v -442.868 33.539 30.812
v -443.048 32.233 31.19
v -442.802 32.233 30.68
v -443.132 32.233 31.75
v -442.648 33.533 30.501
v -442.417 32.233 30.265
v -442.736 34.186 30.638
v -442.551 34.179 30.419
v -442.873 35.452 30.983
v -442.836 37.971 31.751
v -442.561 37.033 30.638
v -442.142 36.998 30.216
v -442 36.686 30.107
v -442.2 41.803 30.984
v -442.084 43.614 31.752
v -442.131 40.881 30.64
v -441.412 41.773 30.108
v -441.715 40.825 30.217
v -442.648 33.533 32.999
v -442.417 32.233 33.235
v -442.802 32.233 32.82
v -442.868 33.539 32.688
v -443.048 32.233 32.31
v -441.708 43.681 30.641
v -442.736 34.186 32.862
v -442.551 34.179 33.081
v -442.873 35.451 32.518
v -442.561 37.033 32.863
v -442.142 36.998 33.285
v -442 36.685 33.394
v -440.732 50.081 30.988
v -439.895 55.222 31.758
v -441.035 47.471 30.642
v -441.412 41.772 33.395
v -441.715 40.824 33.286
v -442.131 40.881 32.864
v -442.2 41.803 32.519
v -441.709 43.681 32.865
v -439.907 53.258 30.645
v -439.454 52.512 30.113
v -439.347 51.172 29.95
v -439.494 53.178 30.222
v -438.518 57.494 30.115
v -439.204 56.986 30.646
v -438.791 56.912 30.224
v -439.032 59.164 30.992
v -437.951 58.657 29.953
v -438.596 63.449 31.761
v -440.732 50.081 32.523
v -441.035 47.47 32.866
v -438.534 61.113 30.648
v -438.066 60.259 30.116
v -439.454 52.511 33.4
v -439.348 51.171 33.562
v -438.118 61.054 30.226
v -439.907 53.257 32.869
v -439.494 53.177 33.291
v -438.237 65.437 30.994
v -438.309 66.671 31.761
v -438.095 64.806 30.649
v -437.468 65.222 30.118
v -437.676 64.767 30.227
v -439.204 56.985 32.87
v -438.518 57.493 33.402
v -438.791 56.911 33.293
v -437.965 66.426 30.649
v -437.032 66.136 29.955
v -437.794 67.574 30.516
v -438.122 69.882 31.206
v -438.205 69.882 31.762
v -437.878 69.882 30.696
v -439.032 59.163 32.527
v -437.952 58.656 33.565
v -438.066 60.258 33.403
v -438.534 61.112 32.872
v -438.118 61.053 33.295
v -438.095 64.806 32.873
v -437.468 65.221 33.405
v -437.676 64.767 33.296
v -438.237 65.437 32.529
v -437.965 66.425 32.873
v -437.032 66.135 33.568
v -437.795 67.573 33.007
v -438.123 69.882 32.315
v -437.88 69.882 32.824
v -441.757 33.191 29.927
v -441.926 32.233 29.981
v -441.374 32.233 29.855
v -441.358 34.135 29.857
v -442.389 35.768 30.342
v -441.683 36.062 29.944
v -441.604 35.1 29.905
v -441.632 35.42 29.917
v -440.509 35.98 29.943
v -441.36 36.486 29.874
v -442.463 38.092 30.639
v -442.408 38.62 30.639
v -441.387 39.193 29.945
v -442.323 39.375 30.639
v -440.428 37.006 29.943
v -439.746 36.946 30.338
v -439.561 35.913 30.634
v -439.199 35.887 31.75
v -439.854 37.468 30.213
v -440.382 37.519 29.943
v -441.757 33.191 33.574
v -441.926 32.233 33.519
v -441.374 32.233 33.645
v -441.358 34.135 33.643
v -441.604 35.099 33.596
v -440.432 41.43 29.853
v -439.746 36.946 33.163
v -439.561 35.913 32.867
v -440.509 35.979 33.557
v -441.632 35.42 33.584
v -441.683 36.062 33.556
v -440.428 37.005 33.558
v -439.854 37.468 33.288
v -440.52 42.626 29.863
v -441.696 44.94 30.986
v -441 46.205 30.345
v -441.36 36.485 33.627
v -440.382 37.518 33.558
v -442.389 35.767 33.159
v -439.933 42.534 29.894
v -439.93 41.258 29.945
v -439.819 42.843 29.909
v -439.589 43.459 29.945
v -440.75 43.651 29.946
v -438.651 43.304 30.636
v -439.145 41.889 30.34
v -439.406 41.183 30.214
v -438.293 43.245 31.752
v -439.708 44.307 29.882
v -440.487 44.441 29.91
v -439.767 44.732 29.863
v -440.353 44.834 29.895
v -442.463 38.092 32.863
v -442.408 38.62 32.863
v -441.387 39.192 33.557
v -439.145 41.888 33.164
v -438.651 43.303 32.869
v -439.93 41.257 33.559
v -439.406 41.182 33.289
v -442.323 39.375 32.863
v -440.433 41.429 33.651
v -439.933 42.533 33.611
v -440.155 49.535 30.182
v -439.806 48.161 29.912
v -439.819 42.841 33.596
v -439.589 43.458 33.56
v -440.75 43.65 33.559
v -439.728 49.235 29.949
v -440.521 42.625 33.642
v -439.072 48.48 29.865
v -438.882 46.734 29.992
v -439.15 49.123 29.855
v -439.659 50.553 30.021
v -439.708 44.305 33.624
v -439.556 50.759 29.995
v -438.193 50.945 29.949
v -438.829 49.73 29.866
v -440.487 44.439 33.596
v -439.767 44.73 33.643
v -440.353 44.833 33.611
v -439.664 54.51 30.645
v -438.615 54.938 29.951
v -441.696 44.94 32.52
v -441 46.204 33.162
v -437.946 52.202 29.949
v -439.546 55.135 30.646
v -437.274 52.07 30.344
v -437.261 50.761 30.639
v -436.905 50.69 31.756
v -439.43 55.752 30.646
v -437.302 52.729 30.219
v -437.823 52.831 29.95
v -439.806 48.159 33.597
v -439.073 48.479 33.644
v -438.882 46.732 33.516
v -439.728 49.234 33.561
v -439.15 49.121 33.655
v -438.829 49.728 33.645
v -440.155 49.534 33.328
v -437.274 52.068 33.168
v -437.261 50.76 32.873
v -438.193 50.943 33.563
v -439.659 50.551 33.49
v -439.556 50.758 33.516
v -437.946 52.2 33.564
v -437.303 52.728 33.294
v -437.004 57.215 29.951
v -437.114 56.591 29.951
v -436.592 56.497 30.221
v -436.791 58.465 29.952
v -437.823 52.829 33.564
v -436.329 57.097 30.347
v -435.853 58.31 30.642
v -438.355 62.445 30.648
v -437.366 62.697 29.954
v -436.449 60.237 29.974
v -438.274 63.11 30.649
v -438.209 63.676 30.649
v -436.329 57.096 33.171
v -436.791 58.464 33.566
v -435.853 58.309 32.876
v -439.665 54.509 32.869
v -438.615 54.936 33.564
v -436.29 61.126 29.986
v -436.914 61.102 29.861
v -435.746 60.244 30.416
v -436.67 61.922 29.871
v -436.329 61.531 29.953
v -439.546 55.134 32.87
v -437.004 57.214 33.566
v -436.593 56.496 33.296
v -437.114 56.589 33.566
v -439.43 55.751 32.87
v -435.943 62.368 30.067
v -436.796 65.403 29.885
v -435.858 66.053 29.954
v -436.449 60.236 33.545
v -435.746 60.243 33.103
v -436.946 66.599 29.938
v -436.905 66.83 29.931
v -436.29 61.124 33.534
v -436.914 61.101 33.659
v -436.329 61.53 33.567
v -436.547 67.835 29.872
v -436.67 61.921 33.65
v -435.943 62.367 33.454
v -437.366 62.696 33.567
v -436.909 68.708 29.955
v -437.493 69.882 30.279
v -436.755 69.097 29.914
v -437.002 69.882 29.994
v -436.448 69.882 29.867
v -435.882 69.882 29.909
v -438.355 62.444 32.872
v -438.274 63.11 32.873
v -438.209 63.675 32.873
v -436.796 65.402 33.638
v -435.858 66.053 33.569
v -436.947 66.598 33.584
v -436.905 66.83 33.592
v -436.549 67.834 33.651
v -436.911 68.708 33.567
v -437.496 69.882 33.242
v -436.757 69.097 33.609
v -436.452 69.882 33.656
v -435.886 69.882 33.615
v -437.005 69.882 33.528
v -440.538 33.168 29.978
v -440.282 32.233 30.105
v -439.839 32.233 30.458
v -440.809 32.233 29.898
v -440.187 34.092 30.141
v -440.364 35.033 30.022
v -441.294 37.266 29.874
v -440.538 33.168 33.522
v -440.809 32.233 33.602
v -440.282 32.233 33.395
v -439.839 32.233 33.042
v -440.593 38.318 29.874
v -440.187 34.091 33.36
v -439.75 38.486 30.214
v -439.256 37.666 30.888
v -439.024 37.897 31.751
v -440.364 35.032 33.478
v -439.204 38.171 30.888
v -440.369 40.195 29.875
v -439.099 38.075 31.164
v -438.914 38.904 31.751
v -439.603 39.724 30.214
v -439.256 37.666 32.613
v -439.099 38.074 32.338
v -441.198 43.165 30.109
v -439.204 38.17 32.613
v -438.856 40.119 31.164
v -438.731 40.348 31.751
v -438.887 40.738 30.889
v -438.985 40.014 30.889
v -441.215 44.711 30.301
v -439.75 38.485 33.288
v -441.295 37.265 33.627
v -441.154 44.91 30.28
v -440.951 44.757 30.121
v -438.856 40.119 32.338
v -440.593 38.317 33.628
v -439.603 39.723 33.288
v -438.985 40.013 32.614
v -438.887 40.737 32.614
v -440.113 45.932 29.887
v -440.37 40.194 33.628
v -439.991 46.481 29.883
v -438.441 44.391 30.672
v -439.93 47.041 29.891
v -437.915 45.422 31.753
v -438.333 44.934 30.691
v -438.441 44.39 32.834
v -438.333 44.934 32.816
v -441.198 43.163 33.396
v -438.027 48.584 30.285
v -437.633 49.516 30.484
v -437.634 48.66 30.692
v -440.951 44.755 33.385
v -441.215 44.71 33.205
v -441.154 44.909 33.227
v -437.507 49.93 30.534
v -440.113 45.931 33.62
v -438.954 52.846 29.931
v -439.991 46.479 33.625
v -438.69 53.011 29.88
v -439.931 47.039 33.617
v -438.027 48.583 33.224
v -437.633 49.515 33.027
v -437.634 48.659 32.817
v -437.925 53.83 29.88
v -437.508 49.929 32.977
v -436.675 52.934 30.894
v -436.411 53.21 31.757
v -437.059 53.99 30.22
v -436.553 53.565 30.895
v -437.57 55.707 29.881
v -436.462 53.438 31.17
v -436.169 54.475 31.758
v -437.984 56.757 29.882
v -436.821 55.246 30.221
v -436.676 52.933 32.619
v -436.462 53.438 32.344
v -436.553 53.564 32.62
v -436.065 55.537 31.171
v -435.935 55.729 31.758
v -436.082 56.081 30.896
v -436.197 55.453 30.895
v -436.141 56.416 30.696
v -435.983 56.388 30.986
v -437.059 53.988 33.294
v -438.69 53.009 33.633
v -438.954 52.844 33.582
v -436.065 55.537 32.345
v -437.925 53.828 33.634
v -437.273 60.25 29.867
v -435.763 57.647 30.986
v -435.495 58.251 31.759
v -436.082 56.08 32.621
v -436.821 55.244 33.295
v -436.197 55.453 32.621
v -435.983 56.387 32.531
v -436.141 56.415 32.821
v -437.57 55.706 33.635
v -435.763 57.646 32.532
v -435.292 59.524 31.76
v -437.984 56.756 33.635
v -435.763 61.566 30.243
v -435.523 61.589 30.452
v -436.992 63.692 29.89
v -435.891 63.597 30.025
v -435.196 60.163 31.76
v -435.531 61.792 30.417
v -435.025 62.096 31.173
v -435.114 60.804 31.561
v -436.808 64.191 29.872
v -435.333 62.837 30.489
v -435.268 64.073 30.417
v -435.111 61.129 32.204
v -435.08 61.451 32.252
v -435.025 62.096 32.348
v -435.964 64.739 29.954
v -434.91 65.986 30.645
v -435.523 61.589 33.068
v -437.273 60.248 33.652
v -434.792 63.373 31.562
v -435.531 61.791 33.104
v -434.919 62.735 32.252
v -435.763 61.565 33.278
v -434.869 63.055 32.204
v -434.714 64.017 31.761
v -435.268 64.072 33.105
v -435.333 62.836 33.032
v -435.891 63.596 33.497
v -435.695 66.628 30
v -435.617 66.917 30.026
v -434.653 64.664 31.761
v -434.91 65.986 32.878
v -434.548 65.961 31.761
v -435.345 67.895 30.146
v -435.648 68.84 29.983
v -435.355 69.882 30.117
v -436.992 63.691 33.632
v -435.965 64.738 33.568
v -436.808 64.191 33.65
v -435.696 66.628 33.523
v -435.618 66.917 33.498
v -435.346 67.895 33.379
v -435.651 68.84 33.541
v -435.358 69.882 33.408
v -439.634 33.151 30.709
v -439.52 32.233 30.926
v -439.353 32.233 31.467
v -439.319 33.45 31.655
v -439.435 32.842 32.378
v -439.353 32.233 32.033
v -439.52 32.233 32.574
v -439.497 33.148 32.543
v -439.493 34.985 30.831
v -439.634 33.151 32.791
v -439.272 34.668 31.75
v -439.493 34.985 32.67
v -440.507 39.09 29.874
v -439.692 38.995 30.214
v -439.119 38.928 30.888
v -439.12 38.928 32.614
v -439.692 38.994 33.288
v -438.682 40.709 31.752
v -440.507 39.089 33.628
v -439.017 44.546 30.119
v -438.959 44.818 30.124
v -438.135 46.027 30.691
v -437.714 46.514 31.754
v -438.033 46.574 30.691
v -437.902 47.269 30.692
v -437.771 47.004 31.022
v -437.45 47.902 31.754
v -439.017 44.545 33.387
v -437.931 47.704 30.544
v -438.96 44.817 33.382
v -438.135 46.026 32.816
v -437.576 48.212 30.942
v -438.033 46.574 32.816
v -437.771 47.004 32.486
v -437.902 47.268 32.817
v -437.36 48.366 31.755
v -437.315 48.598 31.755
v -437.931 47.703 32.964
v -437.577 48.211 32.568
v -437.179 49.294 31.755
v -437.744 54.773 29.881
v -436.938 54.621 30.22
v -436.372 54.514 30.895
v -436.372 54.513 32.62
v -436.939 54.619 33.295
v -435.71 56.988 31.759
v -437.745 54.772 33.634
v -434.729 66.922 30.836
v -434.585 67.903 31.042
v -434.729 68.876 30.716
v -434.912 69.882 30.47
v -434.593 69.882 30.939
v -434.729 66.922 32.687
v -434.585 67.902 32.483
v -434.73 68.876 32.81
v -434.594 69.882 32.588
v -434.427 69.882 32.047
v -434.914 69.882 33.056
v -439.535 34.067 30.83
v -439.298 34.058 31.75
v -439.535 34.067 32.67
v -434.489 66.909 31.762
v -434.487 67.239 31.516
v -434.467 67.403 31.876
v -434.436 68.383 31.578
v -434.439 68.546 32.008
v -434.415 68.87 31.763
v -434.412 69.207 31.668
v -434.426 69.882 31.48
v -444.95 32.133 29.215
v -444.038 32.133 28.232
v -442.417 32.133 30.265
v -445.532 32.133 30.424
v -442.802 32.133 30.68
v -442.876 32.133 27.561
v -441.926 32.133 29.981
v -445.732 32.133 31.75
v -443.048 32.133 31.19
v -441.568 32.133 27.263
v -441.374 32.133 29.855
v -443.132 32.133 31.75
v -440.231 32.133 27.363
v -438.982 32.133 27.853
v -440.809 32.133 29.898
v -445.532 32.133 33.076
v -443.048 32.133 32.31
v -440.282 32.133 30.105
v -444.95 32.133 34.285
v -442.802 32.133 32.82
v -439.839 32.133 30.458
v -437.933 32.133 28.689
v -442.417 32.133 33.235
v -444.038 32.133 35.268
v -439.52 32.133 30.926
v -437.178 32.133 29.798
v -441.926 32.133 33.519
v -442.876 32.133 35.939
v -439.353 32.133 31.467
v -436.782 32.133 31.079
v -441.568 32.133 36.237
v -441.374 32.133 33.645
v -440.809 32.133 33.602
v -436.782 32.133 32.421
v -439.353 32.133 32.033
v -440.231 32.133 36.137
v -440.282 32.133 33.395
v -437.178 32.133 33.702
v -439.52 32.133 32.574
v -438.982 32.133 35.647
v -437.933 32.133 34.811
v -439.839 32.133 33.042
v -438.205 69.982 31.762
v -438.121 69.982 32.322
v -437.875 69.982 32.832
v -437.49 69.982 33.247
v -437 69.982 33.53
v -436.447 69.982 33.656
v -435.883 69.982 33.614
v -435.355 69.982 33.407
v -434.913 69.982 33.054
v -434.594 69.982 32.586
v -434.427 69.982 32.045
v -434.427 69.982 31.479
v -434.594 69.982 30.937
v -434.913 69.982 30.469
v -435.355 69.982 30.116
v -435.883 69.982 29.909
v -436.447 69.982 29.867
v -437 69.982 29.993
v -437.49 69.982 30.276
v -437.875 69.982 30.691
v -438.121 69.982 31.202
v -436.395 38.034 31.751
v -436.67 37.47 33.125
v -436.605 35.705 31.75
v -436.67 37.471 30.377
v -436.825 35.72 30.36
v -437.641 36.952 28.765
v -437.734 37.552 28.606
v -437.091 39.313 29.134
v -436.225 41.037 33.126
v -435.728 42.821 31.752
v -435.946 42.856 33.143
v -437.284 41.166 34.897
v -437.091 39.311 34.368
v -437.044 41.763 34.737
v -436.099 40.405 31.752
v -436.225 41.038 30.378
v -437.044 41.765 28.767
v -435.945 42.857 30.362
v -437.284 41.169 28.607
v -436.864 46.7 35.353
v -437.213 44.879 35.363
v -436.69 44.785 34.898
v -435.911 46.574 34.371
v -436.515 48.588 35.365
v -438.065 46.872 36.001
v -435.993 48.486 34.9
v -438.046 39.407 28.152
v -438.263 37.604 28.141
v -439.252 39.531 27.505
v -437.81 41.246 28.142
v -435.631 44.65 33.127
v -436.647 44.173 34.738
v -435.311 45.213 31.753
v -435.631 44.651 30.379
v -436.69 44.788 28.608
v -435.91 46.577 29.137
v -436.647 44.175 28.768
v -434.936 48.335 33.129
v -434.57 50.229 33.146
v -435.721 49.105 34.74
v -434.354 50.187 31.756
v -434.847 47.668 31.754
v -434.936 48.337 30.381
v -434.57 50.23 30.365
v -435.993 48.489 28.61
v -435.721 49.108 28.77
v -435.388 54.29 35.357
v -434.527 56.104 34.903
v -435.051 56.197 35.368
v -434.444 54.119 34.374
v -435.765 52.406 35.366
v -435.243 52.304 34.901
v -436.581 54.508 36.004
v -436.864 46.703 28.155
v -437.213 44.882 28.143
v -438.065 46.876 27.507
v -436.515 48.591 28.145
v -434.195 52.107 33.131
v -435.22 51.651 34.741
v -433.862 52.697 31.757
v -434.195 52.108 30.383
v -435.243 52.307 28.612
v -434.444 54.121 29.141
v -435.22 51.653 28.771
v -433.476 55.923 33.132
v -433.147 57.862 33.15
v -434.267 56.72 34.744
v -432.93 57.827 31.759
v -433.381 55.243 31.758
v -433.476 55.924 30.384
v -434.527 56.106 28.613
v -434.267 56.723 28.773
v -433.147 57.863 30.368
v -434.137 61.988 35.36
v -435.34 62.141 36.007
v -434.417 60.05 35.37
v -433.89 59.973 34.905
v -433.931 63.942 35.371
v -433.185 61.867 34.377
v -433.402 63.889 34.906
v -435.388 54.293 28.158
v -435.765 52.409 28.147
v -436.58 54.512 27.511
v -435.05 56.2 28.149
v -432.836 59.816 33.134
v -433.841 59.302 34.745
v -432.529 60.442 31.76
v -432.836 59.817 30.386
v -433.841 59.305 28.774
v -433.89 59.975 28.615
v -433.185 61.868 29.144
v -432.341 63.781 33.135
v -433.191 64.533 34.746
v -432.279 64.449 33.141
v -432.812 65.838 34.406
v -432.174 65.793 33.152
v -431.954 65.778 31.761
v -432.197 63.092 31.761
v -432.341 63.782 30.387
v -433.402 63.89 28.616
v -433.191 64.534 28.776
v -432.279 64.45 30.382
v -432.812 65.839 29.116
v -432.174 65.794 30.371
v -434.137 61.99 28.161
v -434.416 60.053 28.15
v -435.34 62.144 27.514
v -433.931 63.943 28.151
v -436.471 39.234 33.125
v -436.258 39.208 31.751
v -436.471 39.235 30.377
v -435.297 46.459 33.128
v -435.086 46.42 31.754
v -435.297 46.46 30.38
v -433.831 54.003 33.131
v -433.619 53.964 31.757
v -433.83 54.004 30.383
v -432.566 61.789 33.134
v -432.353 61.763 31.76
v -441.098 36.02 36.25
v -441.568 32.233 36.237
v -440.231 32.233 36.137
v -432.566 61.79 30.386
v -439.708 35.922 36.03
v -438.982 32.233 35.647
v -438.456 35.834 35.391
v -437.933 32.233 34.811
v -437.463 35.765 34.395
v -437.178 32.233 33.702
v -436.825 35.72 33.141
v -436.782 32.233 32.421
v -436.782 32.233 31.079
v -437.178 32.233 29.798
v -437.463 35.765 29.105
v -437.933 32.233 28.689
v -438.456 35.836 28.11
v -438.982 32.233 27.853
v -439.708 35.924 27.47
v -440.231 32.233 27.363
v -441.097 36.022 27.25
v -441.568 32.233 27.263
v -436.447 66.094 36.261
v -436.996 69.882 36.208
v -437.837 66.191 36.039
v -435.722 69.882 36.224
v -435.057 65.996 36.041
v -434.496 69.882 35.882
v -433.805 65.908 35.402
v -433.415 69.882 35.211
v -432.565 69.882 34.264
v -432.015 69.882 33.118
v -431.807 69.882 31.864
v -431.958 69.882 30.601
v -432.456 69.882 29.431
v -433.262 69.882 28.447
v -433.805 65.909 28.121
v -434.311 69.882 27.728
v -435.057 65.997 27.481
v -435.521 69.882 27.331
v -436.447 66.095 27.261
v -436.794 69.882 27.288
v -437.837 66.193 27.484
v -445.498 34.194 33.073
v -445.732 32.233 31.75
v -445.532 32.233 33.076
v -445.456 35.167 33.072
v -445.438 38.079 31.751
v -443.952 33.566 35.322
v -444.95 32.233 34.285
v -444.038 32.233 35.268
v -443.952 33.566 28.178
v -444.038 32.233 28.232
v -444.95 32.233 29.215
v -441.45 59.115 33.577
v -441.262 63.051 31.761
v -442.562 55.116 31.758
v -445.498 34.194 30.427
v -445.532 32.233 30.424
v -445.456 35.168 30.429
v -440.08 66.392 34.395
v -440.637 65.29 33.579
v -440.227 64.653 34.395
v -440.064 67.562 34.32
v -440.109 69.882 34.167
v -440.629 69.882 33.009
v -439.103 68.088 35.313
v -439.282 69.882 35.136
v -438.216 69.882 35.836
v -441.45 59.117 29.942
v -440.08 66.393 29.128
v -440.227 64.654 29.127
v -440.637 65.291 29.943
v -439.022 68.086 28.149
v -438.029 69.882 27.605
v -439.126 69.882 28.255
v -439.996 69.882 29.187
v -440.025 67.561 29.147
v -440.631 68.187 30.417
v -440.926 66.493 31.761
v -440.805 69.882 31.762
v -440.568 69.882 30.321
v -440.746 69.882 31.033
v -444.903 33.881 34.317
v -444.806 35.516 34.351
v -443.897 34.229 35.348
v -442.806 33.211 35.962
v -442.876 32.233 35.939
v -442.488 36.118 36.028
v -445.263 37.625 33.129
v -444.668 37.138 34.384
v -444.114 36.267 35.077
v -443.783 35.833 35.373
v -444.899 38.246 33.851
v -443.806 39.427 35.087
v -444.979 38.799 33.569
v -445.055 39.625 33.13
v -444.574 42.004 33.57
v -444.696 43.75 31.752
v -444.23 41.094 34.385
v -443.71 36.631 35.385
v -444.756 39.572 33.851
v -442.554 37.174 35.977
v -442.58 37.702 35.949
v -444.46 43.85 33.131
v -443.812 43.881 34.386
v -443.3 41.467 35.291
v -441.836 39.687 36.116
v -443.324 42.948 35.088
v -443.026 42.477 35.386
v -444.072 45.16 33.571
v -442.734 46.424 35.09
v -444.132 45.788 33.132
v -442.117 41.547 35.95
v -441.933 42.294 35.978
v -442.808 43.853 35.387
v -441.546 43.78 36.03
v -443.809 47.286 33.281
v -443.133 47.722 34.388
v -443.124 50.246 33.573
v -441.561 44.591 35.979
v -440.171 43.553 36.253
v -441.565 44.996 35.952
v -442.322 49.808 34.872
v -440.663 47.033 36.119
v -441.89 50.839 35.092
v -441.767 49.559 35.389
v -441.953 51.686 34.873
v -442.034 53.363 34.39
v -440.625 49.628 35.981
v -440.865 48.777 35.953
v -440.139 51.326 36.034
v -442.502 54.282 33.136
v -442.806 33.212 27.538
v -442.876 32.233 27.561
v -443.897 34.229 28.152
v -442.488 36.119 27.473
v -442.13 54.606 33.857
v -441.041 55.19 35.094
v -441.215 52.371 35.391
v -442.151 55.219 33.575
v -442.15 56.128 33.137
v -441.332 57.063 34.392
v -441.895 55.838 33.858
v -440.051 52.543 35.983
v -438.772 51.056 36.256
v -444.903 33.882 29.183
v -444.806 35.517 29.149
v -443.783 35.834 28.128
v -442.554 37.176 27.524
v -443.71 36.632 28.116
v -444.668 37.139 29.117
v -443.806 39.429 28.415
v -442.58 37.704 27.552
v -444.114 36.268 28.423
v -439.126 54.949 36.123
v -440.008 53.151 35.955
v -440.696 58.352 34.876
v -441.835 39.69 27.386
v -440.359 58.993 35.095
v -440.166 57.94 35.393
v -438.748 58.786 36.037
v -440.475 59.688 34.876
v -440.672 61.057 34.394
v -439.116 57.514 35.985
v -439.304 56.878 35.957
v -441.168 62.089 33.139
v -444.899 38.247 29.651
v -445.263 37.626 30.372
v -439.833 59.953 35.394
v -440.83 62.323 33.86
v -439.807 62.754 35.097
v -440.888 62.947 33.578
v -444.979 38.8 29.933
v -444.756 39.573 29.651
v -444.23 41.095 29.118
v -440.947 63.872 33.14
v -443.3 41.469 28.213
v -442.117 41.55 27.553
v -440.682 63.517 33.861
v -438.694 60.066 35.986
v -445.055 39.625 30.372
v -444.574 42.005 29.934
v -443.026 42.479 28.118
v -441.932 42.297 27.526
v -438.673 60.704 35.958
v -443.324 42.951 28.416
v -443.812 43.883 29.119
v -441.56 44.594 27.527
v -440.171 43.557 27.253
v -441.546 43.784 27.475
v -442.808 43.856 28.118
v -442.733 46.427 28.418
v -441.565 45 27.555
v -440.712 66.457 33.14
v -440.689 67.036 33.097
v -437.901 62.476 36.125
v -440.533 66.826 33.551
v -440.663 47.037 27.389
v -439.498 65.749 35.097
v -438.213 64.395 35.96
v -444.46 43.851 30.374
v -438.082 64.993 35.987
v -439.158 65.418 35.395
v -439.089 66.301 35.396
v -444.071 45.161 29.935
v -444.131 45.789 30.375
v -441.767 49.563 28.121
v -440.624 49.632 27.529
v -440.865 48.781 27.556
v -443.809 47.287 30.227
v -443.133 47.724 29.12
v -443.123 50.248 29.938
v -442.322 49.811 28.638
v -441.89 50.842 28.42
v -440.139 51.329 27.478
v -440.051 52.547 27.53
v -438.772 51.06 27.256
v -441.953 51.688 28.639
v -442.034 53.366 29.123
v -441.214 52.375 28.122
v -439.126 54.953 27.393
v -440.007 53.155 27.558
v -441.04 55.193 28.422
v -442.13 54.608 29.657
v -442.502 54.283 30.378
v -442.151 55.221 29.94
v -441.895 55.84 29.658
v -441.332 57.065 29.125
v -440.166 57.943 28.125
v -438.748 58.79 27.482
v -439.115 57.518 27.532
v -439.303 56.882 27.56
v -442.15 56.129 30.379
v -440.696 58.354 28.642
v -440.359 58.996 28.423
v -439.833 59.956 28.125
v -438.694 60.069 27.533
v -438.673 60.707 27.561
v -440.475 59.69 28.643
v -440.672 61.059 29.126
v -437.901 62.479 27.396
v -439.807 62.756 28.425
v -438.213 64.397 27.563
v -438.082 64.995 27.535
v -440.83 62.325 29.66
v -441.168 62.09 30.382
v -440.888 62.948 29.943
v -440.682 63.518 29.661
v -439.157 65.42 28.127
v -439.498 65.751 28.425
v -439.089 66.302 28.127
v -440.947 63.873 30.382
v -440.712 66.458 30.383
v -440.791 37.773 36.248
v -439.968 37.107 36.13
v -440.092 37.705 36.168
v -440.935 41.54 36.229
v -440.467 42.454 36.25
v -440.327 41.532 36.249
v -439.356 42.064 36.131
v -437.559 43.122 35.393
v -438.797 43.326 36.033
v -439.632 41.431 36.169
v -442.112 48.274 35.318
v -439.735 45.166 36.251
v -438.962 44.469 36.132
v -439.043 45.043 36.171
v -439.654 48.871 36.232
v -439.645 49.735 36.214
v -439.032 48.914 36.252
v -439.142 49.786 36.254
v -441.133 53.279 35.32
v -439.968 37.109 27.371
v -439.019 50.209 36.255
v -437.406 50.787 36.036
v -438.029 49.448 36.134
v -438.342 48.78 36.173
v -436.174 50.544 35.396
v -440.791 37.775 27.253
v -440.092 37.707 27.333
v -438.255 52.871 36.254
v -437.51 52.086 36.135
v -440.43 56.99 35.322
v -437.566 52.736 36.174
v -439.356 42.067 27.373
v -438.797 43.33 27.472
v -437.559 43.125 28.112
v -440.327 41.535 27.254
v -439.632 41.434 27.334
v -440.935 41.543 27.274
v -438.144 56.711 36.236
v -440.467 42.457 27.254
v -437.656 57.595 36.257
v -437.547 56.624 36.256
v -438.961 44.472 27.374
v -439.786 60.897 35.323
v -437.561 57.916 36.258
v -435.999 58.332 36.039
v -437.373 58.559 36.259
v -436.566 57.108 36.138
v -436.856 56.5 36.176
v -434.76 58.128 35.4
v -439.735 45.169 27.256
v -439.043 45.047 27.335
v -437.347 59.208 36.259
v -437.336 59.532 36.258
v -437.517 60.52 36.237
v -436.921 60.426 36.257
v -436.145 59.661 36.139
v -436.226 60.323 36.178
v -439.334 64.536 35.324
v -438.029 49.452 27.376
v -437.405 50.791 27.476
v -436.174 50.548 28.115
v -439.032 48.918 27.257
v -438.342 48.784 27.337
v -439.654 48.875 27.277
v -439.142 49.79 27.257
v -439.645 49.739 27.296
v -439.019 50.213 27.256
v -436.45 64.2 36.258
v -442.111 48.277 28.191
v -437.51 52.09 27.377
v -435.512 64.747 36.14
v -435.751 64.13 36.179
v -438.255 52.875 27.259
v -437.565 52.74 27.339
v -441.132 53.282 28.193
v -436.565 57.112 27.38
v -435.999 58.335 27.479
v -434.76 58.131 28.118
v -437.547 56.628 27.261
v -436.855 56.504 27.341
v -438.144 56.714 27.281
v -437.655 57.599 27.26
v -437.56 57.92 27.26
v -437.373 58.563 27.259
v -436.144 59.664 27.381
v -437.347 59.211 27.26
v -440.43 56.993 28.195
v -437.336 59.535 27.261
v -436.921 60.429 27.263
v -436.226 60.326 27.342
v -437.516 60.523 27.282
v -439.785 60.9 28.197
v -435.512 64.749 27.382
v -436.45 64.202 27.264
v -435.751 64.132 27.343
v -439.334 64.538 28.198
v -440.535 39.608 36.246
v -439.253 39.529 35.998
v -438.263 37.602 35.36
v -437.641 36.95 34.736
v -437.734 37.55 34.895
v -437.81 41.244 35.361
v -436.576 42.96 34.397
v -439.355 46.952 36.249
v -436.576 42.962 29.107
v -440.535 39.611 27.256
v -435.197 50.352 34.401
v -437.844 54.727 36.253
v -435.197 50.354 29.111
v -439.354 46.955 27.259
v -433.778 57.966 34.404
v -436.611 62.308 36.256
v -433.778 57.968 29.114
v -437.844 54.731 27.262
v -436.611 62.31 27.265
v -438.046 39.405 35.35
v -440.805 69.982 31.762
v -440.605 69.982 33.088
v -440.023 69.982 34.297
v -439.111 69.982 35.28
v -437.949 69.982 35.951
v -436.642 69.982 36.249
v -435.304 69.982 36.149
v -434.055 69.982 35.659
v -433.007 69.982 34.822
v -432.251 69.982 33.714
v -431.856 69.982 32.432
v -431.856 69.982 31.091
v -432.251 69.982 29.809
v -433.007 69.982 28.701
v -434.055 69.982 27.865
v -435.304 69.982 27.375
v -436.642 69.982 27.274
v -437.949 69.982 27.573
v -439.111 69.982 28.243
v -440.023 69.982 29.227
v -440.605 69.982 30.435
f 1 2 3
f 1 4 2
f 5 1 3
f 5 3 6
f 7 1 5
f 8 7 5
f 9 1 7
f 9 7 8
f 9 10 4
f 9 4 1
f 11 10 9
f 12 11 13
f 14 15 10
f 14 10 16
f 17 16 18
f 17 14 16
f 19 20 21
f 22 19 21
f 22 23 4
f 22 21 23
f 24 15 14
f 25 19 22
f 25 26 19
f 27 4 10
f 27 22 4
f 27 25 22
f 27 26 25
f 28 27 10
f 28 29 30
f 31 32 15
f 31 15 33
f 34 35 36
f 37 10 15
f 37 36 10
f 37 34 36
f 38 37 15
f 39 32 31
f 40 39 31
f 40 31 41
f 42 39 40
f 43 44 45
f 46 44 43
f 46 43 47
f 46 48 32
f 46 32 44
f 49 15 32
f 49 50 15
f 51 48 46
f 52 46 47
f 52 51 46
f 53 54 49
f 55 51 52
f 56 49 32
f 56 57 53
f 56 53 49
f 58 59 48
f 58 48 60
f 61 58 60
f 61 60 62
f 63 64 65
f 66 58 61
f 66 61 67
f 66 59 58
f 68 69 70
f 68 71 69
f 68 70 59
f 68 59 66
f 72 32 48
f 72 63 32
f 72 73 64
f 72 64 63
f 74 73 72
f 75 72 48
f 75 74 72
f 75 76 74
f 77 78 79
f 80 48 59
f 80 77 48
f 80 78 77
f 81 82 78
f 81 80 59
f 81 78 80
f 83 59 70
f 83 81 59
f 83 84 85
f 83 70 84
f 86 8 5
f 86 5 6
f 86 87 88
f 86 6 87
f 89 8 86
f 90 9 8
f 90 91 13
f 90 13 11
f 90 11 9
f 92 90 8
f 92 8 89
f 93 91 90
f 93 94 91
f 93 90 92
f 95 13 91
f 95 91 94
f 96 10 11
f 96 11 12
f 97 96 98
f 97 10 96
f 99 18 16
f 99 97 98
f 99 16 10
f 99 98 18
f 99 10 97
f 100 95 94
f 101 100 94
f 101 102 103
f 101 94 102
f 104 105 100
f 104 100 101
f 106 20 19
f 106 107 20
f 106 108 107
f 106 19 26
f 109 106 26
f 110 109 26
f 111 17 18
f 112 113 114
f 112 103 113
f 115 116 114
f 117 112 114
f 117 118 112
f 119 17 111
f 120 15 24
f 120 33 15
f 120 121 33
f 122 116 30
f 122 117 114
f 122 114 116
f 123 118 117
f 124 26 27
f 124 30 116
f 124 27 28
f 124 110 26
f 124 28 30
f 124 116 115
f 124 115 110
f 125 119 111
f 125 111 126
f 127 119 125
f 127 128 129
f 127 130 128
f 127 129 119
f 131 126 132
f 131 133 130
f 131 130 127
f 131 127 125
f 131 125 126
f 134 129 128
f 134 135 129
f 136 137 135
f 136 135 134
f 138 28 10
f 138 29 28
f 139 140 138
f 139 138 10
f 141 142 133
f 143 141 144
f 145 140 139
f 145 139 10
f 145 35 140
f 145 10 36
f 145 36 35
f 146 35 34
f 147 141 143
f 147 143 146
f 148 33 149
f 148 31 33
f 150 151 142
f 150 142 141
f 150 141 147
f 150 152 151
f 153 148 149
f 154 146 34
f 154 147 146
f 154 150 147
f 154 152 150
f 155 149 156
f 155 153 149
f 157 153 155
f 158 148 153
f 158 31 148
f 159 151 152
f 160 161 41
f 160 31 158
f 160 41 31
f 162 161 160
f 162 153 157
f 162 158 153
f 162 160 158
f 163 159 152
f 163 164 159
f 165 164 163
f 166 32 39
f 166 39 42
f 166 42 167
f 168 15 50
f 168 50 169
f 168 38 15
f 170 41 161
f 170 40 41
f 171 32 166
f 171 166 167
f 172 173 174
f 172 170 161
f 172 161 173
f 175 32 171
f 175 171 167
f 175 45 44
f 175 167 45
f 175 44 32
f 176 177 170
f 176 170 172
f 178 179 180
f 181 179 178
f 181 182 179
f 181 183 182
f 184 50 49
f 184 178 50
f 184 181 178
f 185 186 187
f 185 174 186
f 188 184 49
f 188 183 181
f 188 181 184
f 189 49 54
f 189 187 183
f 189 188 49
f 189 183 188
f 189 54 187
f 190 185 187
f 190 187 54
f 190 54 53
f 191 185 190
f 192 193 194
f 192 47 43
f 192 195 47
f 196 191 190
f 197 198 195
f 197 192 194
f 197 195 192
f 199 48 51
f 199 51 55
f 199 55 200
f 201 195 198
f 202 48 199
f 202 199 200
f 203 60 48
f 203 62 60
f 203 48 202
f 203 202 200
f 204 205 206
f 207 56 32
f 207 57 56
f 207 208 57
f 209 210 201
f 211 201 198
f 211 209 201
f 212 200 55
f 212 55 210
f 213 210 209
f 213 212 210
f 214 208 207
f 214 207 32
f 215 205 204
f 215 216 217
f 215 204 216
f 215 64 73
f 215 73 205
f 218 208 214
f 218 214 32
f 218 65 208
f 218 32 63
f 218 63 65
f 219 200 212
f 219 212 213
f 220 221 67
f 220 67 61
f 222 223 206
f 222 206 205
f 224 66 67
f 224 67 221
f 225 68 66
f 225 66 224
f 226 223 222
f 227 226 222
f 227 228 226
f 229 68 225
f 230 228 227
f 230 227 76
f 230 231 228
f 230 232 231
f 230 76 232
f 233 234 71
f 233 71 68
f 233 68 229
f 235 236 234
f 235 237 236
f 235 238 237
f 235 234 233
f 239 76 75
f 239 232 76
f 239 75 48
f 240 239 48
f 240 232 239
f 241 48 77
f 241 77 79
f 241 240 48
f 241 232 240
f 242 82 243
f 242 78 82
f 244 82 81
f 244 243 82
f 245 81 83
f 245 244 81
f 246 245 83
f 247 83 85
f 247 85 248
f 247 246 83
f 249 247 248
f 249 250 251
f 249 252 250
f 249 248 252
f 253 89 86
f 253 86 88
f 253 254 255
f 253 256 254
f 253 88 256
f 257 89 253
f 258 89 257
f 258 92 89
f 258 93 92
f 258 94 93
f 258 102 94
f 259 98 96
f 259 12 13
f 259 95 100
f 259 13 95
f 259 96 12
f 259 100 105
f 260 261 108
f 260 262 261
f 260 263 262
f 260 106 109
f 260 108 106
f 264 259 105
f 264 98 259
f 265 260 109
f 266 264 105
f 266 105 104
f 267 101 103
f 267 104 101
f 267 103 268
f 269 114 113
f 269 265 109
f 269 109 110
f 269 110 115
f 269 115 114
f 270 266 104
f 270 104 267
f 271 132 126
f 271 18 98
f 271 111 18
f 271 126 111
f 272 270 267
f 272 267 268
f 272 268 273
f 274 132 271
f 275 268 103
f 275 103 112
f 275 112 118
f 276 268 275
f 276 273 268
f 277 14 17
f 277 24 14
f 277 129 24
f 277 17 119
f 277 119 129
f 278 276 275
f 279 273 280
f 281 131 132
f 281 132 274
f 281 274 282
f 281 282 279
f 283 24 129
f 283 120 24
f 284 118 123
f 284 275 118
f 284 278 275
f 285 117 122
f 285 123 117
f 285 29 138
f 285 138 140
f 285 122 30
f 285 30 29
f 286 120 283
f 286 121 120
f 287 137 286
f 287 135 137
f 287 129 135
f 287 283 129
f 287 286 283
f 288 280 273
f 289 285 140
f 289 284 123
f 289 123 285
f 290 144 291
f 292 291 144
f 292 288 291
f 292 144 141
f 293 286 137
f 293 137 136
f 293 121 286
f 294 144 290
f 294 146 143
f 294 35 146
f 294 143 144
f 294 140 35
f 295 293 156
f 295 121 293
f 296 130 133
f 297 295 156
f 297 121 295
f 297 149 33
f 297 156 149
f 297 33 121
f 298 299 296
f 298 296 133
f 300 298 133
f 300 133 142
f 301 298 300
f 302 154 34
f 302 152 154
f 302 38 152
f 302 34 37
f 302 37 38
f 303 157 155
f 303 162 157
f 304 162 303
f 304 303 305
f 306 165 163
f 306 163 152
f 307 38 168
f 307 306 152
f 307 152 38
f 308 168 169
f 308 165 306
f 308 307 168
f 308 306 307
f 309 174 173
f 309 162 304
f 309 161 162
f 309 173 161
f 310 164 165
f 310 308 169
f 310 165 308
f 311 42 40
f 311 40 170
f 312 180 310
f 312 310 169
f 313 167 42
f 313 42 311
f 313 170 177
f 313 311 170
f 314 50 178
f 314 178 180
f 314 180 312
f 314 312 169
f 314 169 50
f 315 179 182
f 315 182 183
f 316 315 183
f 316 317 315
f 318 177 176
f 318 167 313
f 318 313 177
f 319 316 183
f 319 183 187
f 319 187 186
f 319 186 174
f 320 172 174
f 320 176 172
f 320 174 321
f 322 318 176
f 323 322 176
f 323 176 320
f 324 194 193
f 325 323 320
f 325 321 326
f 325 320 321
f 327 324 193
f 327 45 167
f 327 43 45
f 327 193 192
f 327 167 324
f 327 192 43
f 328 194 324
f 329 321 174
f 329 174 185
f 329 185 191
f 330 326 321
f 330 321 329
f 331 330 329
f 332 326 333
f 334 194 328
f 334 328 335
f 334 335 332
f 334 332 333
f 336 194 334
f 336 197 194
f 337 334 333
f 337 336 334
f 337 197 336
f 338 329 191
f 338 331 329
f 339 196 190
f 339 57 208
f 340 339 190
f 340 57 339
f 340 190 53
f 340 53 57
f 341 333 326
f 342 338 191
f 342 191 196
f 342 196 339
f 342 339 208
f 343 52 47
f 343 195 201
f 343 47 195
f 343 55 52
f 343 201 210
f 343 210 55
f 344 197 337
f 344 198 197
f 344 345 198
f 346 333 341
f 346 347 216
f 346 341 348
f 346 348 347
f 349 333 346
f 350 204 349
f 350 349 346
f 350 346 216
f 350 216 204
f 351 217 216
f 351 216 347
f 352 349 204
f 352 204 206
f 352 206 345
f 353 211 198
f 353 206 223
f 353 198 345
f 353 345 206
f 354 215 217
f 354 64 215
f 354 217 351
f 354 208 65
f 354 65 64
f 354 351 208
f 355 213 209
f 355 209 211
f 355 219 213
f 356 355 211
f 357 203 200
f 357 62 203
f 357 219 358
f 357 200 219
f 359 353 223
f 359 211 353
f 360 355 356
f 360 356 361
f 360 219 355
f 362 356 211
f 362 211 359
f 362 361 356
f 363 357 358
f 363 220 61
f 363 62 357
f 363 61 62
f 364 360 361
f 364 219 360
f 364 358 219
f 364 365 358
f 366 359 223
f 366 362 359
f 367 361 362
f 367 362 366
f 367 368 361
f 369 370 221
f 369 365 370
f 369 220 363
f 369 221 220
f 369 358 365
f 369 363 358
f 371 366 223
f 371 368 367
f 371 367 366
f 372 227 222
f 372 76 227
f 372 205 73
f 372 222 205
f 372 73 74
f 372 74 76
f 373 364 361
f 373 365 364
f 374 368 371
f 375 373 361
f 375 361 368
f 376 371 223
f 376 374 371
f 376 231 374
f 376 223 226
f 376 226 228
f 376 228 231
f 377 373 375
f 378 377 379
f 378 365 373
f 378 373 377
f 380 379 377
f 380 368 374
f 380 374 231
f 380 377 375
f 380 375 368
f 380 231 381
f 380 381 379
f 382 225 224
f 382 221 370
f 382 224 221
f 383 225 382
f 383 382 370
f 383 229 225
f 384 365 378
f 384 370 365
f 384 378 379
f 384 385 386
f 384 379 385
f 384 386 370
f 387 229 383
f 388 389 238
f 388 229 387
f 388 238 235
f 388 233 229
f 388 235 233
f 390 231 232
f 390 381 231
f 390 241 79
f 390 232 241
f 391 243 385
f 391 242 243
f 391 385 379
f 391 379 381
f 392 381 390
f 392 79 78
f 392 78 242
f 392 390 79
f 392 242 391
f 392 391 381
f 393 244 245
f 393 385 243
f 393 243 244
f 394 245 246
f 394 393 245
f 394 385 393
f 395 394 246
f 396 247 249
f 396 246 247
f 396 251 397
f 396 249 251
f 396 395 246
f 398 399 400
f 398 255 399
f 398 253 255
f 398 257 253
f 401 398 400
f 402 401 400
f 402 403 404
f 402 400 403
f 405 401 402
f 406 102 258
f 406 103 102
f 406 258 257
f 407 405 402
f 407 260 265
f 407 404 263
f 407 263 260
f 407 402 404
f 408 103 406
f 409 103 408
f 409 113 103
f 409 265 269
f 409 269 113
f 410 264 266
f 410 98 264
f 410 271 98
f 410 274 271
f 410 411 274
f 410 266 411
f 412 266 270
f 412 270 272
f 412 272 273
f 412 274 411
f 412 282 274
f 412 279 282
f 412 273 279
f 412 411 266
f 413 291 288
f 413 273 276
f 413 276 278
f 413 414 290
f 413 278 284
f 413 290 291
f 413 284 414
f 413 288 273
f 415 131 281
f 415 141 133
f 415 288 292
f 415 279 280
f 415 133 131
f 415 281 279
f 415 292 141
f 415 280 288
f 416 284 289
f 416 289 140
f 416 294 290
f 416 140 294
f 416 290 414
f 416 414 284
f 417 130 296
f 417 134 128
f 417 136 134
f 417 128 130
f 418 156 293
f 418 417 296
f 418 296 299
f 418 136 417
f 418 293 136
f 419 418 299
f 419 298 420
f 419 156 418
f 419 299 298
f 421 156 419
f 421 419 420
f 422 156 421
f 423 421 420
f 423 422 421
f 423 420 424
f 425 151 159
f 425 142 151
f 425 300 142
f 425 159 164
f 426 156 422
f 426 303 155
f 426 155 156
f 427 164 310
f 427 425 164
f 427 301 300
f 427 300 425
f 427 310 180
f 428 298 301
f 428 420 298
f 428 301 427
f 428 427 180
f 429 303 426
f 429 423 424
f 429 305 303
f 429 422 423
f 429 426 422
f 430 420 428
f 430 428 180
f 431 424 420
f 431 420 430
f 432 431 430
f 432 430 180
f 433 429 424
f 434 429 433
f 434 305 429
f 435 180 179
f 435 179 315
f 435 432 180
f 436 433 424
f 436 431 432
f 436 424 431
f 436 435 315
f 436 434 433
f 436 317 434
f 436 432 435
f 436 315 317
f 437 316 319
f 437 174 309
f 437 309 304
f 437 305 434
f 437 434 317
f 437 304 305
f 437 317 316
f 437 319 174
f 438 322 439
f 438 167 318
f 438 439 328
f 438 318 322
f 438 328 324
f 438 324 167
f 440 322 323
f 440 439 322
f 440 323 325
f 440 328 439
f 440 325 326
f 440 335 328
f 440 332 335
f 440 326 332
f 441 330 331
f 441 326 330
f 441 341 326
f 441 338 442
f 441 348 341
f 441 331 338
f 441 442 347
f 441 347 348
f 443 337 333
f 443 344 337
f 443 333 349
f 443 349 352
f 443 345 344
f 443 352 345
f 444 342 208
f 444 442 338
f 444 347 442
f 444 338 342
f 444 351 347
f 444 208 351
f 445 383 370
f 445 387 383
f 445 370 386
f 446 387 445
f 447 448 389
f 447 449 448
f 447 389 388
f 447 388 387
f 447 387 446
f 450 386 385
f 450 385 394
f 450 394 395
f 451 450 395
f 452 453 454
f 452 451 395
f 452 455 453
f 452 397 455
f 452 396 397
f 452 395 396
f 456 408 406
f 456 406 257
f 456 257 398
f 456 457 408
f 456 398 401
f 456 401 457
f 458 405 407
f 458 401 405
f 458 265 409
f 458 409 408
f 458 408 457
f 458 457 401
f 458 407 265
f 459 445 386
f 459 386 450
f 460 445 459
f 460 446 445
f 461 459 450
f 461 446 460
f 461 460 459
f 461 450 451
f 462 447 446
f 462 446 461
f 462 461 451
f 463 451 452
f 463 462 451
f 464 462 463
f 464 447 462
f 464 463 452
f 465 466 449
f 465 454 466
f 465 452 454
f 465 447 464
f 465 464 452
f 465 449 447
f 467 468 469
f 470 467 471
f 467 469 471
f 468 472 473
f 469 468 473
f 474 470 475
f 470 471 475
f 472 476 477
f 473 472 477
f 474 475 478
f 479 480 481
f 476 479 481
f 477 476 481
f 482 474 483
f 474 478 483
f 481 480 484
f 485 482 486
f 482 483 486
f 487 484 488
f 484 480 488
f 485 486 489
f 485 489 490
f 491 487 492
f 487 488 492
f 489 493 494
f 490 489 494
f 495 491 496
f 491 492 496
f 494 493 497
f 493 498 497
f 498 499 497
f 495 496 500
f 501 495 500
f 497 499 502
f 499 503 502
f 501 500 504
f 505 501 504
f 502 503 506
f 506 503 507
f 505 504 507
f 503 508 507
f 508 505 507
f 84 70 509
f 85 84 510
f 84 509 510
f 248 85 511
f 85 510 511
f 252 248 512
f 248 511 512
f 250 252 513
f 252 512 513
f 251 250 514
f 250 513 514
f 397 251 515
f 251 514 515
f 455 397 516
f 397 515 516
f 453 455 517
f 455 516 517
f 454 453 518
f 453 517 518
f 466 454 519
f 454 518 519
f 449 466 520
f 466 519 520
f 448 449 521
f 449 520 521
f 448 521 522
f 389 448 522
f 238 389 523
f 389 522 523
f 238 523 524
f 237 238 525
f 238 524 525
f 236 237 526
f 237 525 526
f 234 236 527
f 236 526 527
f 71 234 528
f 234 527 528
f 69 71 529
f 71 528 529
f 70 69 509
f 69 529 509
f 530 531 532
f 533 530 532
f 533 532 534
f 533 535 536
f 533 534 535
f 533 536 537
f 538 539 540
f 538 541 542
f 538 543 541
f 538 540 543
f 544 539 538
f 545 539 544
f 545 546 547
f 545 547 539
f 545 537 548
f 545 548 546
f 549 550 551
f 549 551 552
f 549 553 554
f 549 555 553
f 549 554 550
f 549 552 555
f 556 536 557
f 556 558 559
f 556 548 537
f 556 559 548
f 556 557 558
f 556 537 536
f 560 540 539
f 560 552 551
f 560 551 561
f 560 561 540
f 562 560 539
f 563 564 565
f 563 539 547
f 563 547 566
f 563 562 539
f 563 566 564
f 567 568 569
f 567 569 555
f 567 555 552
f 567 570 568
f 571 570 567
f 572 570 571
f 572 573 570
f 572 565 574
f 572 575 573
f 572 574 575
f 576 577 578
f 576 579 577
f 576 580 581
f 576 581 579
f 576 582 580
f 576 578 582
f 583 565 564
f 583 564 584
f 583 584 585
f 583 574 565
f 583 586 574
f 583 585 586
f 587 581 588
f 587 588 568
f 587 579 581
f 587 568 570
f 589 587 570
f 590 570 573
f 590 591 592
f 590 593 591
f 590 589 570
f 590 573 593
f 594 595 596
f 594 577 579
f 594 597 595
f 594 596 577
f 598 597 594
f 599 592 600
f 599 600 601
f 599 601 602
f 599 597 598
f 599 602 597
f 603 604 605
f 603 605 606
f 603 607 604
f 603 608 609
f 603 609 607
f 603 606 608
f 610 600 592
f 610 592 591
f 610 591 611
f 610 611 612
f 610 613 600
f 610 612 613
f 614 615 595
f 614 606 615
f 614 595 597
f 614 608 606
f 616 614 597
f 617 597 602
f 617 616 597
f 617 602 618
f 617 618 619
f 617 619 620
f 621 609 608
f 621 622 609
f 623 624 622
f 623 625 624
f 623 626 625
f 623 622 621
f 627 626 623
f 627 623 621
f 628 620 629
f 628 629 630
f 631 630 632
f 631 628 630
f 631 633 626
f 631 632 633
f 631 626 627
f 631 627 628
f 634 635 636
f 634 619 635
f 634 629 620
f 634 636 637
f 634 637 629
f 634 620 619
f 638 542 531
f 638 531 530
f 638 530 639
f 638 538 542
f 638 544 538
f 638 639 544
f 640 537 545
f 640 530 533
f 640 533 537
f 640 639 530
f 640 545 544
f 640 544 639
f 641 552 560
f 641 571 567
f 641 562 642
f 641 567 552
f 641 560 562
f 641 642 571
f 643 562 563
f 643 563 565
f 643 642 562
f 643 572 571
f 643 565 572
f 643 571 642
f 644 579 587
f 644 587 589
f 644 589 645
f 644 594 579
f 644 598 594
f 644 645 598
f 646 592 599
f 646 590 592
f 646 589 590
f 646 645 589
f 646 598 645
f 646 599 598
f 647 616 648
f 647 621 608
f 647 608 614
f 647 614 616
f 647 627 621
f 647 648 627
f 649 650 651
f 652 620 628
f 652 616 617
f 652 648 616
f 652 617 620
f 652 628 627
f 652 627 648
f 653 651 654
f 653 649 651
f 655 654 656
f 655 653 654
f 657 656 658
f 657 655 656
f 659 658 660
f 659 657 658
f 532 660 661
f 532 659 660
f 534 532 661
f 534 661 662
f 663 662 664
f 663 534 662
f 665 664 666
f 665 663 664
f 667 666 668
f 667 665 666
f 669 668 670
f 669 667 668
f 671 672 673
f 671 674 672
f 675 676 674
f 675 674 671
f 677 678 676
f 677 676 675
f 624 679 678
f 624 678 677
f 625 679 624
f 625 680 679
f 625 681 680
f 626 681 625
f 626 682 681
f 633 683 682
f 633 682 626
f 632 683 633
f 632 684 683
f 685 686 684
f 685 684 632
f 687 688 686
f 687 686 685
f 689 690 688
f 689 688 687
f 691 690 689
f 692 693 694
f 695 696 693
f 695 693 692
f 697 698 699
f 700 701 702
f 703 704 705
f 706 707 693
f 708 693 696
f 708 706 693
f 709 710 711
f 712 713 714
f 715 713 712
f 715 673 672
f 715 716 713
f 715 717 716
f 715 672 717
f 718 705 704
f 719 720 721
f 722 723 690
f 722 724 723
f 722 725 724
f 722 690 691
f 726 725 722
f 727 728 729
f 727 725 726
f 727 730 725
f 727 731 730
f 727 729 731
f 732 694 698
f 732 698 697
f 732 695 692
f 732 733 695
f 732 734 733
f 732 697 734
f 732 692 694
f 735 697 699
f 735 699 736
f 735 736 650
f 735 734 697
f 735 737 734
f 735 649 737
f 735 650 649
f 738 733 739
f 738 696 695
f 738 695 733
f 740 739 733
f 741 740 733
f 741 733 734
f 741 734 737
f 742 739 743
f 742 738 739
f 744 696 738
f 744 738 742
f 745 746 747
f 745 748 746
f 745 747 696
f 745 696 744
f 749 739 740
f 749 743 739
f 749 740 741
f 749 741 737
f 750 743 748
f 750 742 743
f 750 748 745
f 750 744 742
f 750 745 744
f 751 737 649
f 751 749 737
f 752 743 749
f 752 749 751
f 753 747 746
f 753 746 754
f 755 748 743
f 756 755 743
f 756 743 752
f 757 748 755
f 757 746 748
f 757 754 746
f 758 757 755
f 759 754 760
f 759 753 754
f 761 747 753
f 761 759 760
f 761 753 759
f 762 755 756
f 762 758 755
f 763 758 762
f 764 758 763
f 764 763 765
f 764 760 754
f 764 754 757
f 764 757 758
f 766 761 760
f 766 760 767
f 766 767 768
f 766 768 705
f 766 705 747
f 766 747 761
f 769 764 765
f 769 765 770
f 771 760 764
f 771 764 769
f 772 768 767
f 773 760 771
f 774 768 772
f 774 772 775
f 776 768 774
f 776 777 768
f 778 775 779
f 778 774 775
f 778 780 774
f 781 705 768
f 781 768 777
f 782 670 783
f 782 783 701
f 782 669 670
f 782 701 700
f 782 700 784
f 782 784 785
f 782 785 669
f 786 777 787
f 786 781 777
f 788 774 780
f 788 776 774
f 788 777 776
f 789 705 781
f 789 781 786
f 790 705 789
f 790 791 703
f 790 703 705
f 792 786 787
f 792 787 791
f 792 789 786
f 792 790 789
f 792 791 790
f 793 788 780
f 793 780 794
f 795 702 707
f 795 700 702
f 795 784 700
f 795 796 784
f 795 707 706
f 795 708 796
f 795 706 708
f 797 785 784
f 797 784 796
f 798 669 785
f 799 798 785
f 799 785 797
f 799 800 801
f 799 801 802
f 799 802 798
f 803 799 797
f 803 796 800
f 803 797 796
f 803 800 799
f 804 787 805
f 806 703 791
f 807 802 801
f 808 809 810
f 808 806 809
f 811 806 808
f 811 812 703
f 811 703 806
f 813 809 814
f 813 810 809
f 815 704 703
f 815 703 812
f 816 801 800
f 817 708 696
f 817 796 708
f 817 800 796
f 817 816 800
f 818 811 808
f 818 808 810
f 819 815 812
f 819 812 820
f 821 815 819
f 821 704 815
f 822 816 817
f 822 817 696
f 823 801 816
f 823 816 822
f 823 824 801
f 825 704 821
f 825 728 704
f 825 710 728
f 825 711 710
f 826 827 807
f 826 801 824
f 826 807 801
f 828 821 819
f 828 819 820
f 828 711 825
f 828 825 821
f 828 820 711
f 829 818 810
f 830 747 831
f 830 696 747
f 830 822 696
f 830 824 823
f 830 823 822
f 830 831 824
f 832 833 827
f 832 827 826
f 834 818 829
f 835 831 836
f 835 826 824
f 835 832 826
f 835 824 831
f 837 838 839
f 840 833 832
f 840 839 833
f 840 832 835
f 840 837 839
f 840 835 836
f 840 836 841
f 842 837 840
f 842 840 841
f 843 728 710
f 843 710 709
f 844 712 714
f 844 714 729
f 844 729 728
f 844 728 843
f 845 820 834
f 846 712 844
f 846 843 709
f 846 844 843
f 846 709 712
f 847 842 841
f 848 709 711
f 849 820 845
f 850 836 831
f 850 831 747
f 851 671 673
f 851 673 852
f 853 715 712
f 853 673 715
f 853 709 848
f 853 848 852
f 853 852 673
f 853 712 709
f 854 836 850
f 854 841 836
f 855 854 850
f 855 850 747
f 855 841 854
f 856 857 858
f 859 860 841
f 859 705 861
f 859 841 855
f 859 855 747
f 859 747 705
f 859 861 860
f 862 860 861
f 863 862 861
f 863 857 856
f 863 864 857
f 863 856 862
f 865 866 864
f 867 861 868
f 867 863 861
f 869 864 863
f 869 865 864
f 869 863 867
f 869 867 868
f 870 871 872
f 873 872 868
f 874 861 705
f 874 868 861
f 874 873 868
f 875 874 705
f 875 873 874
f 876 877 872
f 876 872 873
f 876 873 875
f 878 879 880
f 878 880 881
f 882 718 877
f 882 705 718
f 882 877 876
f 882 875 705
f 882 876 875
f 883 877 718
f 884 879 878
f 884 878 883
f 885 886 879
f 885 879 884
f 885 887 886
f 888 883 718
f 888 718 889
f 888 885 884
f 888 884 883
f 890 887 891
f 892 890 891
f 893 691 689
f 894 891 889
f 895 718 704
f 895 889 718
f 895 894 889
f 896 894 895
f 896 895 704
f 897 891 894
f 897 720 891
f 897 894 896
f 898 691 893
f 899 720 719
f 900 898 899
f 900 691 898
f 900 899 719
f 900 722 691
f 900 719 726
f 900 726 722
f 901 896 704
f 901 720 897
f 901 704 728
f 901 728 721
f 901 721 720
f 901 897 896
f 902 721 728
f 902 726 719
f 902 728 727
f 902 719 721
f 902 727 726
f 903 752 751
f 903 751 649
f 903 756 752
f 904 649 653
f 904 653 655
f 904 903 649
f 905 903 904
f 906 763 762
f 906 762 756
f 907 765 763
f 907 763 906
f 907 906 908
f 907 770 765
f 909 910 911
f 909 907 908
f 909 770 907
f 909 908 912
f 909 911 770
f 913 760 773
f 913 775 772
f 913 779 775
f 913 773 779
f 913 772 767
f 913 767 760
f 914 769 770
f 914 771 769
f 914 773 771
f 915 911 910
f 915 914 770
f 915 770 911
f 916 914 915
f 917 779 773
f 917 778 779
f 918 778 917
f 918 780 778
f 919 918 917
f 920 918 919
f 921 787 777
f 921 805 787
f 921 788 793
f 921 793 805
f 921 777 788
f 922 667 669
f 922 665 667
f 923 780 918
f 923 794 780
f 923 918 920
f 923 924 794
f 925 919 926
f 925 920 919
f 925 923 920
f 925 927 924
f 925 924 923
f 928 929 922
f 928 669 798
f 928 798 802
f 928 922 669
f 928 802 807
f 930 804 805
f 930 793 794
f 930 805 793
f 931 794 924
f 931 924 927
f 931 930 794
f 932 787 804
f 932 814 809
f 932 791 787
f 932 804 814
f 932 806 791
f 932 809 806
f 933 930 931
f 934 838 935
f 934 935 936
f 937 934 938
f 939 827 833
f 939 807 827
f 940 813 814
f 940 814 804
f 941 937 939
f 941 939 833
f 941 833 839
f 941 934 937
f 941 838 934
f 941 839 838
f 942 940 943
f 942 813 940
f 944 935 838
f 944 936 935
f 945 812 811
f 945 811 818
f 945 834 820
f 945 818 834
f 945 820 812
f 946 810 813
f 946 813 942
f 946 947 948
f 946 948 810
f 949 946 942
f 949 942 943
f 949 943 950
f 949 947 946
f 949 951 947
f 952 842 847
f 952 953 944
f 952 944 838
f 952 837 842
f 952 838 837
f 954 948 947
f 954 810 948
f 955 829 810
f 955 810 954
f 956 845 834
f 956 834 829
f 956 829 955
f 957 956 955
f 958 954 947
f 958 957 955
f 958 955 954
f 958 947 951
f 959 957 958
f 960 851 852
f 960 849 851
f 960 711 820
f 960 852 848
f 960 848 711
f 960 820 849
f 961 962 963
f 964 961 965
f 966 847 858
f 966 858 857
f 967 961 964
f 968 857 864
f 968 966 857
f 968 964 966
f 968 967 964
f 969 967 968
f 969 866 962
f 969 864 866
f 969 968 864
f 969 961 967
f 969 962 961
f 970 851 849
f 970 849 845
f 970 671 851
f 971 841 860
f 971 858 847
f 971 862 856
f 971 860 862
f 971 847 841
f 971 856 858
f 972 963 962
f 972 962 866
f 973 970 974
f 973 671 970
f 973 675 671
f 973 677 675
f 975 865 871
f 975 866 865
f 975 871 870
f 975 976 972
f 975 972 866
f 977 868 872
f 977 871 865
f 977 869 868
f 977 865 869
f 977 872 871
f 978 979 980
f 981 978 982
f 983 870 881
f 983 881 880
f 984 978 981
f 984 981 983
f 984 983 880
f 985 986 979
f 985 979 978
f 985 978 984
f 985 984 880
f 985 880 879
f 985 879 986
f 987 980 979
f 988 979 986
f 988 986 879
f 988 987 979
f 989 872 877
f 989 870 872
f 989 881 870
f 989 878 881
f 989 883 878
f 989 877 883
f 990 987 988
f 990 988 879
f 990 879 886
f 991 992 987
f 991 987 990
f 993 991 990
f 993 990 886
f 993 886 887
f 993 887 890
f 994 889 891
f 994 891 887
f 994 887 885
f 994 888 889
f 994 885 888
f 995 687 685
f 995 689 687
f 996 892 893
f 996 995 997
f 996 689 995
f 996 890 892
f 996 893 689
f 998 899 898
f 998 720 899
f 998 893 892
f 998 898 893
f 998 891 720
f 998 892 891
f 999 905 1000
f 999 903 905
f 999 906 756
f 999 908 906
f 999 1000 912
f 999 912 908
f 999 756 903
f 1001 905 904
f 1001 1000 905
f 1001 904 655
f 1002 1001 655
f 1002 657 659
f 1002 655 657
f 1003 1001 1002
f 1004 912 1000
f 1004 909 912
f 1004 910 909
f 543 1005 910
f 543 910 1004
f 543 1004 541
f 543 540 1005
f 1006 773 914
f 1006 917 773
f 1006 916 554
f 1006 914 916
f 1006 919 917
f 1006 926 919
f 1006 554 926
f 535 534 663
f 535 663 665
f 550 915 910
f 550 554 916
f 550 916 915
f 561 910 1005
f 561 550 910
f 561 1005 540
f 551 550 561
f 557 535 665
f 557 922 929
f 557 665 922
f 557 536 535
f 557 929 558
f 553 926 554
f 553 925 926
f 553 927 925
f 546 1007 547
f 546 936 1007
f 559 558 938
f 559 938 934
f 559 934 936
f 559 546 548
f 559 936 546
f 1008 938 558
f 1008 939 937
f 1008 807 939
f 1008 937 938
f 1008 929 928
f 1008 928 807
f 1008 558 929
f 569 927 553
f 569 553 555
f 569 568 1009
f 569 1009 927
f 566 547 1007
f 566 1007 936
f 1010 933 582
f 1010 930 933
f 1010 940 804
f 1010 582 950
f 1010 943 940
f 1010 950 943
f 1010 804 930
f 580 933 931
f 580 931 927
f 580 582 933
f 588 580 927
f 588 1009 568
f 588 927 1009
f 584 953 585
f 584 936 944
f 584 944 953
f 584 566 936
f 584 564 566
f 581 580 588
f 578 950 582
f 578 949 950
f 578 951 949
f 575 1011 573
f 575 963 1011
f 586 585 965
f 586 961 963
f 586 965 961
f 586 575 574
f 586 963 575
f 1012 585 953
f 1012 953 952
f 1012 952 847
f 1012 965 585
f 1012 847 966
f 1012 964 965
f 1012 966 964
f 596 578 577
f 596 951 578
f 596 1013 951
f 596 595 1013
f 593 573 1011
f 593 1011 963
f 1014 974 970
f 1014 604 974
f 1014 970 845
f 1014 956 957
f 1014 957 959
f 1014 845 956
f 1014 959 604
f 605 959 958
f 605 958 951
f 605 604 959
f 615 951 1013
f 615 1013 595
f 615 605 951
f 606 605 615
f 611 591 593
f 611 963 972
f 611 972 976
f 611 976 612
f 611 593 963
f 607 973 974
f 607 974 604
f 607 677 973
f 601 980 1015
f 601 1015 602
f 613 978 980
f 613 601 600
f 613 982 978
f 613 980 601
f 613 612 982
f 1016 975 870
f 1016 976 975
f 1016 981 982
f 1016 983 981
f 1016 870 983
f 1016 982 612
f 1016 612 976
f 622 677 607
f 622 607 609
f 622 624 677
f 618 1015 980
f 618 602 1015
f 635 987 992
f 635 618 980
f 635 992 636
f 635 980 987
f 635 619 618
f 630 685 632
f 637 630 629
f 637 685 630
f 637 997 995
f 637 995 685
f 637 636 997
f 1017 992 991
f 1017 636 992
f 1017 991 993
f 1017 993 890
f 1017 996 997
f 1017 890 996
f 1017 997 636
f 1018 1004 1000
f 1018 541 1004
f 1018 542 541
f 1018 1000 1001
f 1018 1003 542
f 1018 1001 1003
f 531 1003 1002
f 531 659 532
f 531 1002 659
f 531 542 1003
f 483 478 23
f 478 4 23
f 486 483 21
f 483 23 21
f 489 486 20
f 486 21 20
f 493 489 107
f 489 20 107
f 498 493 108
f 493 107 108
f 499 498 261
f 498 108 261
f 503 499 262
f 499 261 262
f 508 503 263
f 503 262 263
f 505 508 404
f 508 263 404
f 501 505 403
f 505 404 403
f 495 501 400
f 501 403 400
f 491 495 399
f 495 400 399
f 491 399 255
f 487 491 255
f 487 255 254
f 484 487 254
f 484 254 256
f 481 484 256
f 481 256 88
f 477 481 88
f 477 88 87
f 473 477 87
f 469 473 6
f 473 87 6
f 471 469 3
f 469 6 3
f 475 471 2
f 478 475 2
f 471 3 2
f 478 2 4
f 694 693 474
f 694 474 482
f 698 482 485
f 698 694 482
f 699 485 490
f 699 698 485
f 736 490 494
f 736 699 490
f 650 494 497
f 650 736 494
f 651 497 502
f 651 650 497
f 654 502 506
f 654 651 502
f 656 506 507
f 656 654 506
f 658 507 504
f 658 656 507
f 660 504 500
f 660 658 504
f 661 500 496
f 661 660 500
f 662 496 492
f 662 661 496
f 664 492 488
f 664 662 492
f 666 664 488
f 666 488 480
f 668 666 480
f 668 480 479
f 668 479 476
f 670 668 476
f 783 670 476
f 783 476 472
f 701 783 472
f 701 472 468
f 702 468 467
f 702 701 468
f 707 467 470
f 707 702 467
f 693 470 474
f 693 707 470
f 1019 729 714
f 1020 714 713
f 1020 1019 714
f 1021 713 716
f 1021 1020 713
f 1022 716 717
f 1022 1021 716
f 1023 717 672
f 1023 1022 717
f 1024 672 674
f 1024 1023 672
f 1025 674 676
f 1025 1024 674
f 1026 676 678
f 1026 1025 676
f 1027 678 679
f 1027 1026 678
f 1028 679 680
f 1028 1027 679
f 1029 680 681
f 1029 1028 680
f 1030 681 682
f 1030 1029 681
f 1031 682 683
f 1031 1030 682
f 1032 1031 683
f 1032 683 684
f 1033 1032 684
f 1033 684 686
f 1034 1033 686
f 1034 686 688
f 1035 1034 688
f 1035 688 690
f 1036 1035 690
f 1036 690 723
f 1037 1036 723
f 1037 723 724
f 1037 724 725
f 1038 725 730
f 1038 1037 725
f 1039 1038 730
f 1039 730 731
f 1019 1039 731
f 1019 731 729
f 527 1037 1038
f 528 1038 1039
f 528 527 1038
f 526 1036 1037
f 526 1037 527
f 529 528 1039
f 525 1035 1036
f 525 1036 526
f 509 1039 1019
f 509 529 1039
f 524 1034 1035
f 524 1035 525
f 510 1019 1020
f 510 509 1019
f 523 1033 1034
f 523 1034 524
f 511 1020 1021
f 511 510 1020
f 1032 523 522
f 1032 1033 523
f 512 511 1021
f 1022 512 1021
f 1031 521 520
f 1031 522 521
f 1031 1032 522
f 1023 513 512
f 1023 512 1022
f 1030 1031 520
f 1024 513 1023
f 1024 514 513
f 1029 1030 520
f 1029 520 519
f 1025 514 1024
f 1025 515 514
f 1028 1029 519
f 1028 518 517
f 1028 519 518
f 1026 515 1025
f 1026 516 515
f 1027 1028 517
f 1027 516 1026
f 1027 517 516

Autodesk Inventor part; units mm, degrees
ref_plane "YZ Plane" through (0, 0, 0) normal (1, 0, 0) x (0, 1, 0)
ref_plane "XZ Plane" through (0, 0, 0) normal (0, 1, 0) x (-1, 0, 0)
ref_plane "XY Plane" through (0, 0, 0) normal (0, 0, 1) x (1, 0, 0)
ref_plane "Work Plane3" through (-441.2322, 32.2326, 31.75) normal (0, 1, 0) x (-1, 0, 0)
sketch "Sketch7" plane through (-441.2322, 32.2326, 31.75) normal (0, 1, 0) x (-1, 0, 0)
  circle A0 centre (0, 0) radius 4.5
  circle A1 centre (0, 0) radius 1.9
sketch3d "3D Sketch1"
  line L0 (-441.2322, 32.1326, 31.75) -> (-441.2322, 32.2326, 31.75)
  spline S0 degree 3 poles (-441.2322, 32.2326, 31.75) (-441.2322, 44.8894, 31.75) (-436.3054, 57.2253, 31.7617) (-436.3054, 69.8821, 31.7617) knots 0 0 0 0 3.797054 3.797054 3.797054 3.797054
  line L1 (-436.3054, 69.8821, 31.7617) -> (-436.3054, 69.9821, 31.7617)
  dimension "d19" = 1
  dimension "d20" = 1
sweep "Sweep1" add profiles "Sketch7" path "3D Sketch1"
equation "\"ID\" = 3.8"
equation "\"OD_\" = 9"
equation "\"L\" = PL"
equation "\"PL\" = 38.035"
equation "\"OD\" = 12.345"
equation "\"RPL\" = 39"
equation "\"OPL\" = 38.035"
equation "\"ROPL\" = 39"
properties material "Rubber"
